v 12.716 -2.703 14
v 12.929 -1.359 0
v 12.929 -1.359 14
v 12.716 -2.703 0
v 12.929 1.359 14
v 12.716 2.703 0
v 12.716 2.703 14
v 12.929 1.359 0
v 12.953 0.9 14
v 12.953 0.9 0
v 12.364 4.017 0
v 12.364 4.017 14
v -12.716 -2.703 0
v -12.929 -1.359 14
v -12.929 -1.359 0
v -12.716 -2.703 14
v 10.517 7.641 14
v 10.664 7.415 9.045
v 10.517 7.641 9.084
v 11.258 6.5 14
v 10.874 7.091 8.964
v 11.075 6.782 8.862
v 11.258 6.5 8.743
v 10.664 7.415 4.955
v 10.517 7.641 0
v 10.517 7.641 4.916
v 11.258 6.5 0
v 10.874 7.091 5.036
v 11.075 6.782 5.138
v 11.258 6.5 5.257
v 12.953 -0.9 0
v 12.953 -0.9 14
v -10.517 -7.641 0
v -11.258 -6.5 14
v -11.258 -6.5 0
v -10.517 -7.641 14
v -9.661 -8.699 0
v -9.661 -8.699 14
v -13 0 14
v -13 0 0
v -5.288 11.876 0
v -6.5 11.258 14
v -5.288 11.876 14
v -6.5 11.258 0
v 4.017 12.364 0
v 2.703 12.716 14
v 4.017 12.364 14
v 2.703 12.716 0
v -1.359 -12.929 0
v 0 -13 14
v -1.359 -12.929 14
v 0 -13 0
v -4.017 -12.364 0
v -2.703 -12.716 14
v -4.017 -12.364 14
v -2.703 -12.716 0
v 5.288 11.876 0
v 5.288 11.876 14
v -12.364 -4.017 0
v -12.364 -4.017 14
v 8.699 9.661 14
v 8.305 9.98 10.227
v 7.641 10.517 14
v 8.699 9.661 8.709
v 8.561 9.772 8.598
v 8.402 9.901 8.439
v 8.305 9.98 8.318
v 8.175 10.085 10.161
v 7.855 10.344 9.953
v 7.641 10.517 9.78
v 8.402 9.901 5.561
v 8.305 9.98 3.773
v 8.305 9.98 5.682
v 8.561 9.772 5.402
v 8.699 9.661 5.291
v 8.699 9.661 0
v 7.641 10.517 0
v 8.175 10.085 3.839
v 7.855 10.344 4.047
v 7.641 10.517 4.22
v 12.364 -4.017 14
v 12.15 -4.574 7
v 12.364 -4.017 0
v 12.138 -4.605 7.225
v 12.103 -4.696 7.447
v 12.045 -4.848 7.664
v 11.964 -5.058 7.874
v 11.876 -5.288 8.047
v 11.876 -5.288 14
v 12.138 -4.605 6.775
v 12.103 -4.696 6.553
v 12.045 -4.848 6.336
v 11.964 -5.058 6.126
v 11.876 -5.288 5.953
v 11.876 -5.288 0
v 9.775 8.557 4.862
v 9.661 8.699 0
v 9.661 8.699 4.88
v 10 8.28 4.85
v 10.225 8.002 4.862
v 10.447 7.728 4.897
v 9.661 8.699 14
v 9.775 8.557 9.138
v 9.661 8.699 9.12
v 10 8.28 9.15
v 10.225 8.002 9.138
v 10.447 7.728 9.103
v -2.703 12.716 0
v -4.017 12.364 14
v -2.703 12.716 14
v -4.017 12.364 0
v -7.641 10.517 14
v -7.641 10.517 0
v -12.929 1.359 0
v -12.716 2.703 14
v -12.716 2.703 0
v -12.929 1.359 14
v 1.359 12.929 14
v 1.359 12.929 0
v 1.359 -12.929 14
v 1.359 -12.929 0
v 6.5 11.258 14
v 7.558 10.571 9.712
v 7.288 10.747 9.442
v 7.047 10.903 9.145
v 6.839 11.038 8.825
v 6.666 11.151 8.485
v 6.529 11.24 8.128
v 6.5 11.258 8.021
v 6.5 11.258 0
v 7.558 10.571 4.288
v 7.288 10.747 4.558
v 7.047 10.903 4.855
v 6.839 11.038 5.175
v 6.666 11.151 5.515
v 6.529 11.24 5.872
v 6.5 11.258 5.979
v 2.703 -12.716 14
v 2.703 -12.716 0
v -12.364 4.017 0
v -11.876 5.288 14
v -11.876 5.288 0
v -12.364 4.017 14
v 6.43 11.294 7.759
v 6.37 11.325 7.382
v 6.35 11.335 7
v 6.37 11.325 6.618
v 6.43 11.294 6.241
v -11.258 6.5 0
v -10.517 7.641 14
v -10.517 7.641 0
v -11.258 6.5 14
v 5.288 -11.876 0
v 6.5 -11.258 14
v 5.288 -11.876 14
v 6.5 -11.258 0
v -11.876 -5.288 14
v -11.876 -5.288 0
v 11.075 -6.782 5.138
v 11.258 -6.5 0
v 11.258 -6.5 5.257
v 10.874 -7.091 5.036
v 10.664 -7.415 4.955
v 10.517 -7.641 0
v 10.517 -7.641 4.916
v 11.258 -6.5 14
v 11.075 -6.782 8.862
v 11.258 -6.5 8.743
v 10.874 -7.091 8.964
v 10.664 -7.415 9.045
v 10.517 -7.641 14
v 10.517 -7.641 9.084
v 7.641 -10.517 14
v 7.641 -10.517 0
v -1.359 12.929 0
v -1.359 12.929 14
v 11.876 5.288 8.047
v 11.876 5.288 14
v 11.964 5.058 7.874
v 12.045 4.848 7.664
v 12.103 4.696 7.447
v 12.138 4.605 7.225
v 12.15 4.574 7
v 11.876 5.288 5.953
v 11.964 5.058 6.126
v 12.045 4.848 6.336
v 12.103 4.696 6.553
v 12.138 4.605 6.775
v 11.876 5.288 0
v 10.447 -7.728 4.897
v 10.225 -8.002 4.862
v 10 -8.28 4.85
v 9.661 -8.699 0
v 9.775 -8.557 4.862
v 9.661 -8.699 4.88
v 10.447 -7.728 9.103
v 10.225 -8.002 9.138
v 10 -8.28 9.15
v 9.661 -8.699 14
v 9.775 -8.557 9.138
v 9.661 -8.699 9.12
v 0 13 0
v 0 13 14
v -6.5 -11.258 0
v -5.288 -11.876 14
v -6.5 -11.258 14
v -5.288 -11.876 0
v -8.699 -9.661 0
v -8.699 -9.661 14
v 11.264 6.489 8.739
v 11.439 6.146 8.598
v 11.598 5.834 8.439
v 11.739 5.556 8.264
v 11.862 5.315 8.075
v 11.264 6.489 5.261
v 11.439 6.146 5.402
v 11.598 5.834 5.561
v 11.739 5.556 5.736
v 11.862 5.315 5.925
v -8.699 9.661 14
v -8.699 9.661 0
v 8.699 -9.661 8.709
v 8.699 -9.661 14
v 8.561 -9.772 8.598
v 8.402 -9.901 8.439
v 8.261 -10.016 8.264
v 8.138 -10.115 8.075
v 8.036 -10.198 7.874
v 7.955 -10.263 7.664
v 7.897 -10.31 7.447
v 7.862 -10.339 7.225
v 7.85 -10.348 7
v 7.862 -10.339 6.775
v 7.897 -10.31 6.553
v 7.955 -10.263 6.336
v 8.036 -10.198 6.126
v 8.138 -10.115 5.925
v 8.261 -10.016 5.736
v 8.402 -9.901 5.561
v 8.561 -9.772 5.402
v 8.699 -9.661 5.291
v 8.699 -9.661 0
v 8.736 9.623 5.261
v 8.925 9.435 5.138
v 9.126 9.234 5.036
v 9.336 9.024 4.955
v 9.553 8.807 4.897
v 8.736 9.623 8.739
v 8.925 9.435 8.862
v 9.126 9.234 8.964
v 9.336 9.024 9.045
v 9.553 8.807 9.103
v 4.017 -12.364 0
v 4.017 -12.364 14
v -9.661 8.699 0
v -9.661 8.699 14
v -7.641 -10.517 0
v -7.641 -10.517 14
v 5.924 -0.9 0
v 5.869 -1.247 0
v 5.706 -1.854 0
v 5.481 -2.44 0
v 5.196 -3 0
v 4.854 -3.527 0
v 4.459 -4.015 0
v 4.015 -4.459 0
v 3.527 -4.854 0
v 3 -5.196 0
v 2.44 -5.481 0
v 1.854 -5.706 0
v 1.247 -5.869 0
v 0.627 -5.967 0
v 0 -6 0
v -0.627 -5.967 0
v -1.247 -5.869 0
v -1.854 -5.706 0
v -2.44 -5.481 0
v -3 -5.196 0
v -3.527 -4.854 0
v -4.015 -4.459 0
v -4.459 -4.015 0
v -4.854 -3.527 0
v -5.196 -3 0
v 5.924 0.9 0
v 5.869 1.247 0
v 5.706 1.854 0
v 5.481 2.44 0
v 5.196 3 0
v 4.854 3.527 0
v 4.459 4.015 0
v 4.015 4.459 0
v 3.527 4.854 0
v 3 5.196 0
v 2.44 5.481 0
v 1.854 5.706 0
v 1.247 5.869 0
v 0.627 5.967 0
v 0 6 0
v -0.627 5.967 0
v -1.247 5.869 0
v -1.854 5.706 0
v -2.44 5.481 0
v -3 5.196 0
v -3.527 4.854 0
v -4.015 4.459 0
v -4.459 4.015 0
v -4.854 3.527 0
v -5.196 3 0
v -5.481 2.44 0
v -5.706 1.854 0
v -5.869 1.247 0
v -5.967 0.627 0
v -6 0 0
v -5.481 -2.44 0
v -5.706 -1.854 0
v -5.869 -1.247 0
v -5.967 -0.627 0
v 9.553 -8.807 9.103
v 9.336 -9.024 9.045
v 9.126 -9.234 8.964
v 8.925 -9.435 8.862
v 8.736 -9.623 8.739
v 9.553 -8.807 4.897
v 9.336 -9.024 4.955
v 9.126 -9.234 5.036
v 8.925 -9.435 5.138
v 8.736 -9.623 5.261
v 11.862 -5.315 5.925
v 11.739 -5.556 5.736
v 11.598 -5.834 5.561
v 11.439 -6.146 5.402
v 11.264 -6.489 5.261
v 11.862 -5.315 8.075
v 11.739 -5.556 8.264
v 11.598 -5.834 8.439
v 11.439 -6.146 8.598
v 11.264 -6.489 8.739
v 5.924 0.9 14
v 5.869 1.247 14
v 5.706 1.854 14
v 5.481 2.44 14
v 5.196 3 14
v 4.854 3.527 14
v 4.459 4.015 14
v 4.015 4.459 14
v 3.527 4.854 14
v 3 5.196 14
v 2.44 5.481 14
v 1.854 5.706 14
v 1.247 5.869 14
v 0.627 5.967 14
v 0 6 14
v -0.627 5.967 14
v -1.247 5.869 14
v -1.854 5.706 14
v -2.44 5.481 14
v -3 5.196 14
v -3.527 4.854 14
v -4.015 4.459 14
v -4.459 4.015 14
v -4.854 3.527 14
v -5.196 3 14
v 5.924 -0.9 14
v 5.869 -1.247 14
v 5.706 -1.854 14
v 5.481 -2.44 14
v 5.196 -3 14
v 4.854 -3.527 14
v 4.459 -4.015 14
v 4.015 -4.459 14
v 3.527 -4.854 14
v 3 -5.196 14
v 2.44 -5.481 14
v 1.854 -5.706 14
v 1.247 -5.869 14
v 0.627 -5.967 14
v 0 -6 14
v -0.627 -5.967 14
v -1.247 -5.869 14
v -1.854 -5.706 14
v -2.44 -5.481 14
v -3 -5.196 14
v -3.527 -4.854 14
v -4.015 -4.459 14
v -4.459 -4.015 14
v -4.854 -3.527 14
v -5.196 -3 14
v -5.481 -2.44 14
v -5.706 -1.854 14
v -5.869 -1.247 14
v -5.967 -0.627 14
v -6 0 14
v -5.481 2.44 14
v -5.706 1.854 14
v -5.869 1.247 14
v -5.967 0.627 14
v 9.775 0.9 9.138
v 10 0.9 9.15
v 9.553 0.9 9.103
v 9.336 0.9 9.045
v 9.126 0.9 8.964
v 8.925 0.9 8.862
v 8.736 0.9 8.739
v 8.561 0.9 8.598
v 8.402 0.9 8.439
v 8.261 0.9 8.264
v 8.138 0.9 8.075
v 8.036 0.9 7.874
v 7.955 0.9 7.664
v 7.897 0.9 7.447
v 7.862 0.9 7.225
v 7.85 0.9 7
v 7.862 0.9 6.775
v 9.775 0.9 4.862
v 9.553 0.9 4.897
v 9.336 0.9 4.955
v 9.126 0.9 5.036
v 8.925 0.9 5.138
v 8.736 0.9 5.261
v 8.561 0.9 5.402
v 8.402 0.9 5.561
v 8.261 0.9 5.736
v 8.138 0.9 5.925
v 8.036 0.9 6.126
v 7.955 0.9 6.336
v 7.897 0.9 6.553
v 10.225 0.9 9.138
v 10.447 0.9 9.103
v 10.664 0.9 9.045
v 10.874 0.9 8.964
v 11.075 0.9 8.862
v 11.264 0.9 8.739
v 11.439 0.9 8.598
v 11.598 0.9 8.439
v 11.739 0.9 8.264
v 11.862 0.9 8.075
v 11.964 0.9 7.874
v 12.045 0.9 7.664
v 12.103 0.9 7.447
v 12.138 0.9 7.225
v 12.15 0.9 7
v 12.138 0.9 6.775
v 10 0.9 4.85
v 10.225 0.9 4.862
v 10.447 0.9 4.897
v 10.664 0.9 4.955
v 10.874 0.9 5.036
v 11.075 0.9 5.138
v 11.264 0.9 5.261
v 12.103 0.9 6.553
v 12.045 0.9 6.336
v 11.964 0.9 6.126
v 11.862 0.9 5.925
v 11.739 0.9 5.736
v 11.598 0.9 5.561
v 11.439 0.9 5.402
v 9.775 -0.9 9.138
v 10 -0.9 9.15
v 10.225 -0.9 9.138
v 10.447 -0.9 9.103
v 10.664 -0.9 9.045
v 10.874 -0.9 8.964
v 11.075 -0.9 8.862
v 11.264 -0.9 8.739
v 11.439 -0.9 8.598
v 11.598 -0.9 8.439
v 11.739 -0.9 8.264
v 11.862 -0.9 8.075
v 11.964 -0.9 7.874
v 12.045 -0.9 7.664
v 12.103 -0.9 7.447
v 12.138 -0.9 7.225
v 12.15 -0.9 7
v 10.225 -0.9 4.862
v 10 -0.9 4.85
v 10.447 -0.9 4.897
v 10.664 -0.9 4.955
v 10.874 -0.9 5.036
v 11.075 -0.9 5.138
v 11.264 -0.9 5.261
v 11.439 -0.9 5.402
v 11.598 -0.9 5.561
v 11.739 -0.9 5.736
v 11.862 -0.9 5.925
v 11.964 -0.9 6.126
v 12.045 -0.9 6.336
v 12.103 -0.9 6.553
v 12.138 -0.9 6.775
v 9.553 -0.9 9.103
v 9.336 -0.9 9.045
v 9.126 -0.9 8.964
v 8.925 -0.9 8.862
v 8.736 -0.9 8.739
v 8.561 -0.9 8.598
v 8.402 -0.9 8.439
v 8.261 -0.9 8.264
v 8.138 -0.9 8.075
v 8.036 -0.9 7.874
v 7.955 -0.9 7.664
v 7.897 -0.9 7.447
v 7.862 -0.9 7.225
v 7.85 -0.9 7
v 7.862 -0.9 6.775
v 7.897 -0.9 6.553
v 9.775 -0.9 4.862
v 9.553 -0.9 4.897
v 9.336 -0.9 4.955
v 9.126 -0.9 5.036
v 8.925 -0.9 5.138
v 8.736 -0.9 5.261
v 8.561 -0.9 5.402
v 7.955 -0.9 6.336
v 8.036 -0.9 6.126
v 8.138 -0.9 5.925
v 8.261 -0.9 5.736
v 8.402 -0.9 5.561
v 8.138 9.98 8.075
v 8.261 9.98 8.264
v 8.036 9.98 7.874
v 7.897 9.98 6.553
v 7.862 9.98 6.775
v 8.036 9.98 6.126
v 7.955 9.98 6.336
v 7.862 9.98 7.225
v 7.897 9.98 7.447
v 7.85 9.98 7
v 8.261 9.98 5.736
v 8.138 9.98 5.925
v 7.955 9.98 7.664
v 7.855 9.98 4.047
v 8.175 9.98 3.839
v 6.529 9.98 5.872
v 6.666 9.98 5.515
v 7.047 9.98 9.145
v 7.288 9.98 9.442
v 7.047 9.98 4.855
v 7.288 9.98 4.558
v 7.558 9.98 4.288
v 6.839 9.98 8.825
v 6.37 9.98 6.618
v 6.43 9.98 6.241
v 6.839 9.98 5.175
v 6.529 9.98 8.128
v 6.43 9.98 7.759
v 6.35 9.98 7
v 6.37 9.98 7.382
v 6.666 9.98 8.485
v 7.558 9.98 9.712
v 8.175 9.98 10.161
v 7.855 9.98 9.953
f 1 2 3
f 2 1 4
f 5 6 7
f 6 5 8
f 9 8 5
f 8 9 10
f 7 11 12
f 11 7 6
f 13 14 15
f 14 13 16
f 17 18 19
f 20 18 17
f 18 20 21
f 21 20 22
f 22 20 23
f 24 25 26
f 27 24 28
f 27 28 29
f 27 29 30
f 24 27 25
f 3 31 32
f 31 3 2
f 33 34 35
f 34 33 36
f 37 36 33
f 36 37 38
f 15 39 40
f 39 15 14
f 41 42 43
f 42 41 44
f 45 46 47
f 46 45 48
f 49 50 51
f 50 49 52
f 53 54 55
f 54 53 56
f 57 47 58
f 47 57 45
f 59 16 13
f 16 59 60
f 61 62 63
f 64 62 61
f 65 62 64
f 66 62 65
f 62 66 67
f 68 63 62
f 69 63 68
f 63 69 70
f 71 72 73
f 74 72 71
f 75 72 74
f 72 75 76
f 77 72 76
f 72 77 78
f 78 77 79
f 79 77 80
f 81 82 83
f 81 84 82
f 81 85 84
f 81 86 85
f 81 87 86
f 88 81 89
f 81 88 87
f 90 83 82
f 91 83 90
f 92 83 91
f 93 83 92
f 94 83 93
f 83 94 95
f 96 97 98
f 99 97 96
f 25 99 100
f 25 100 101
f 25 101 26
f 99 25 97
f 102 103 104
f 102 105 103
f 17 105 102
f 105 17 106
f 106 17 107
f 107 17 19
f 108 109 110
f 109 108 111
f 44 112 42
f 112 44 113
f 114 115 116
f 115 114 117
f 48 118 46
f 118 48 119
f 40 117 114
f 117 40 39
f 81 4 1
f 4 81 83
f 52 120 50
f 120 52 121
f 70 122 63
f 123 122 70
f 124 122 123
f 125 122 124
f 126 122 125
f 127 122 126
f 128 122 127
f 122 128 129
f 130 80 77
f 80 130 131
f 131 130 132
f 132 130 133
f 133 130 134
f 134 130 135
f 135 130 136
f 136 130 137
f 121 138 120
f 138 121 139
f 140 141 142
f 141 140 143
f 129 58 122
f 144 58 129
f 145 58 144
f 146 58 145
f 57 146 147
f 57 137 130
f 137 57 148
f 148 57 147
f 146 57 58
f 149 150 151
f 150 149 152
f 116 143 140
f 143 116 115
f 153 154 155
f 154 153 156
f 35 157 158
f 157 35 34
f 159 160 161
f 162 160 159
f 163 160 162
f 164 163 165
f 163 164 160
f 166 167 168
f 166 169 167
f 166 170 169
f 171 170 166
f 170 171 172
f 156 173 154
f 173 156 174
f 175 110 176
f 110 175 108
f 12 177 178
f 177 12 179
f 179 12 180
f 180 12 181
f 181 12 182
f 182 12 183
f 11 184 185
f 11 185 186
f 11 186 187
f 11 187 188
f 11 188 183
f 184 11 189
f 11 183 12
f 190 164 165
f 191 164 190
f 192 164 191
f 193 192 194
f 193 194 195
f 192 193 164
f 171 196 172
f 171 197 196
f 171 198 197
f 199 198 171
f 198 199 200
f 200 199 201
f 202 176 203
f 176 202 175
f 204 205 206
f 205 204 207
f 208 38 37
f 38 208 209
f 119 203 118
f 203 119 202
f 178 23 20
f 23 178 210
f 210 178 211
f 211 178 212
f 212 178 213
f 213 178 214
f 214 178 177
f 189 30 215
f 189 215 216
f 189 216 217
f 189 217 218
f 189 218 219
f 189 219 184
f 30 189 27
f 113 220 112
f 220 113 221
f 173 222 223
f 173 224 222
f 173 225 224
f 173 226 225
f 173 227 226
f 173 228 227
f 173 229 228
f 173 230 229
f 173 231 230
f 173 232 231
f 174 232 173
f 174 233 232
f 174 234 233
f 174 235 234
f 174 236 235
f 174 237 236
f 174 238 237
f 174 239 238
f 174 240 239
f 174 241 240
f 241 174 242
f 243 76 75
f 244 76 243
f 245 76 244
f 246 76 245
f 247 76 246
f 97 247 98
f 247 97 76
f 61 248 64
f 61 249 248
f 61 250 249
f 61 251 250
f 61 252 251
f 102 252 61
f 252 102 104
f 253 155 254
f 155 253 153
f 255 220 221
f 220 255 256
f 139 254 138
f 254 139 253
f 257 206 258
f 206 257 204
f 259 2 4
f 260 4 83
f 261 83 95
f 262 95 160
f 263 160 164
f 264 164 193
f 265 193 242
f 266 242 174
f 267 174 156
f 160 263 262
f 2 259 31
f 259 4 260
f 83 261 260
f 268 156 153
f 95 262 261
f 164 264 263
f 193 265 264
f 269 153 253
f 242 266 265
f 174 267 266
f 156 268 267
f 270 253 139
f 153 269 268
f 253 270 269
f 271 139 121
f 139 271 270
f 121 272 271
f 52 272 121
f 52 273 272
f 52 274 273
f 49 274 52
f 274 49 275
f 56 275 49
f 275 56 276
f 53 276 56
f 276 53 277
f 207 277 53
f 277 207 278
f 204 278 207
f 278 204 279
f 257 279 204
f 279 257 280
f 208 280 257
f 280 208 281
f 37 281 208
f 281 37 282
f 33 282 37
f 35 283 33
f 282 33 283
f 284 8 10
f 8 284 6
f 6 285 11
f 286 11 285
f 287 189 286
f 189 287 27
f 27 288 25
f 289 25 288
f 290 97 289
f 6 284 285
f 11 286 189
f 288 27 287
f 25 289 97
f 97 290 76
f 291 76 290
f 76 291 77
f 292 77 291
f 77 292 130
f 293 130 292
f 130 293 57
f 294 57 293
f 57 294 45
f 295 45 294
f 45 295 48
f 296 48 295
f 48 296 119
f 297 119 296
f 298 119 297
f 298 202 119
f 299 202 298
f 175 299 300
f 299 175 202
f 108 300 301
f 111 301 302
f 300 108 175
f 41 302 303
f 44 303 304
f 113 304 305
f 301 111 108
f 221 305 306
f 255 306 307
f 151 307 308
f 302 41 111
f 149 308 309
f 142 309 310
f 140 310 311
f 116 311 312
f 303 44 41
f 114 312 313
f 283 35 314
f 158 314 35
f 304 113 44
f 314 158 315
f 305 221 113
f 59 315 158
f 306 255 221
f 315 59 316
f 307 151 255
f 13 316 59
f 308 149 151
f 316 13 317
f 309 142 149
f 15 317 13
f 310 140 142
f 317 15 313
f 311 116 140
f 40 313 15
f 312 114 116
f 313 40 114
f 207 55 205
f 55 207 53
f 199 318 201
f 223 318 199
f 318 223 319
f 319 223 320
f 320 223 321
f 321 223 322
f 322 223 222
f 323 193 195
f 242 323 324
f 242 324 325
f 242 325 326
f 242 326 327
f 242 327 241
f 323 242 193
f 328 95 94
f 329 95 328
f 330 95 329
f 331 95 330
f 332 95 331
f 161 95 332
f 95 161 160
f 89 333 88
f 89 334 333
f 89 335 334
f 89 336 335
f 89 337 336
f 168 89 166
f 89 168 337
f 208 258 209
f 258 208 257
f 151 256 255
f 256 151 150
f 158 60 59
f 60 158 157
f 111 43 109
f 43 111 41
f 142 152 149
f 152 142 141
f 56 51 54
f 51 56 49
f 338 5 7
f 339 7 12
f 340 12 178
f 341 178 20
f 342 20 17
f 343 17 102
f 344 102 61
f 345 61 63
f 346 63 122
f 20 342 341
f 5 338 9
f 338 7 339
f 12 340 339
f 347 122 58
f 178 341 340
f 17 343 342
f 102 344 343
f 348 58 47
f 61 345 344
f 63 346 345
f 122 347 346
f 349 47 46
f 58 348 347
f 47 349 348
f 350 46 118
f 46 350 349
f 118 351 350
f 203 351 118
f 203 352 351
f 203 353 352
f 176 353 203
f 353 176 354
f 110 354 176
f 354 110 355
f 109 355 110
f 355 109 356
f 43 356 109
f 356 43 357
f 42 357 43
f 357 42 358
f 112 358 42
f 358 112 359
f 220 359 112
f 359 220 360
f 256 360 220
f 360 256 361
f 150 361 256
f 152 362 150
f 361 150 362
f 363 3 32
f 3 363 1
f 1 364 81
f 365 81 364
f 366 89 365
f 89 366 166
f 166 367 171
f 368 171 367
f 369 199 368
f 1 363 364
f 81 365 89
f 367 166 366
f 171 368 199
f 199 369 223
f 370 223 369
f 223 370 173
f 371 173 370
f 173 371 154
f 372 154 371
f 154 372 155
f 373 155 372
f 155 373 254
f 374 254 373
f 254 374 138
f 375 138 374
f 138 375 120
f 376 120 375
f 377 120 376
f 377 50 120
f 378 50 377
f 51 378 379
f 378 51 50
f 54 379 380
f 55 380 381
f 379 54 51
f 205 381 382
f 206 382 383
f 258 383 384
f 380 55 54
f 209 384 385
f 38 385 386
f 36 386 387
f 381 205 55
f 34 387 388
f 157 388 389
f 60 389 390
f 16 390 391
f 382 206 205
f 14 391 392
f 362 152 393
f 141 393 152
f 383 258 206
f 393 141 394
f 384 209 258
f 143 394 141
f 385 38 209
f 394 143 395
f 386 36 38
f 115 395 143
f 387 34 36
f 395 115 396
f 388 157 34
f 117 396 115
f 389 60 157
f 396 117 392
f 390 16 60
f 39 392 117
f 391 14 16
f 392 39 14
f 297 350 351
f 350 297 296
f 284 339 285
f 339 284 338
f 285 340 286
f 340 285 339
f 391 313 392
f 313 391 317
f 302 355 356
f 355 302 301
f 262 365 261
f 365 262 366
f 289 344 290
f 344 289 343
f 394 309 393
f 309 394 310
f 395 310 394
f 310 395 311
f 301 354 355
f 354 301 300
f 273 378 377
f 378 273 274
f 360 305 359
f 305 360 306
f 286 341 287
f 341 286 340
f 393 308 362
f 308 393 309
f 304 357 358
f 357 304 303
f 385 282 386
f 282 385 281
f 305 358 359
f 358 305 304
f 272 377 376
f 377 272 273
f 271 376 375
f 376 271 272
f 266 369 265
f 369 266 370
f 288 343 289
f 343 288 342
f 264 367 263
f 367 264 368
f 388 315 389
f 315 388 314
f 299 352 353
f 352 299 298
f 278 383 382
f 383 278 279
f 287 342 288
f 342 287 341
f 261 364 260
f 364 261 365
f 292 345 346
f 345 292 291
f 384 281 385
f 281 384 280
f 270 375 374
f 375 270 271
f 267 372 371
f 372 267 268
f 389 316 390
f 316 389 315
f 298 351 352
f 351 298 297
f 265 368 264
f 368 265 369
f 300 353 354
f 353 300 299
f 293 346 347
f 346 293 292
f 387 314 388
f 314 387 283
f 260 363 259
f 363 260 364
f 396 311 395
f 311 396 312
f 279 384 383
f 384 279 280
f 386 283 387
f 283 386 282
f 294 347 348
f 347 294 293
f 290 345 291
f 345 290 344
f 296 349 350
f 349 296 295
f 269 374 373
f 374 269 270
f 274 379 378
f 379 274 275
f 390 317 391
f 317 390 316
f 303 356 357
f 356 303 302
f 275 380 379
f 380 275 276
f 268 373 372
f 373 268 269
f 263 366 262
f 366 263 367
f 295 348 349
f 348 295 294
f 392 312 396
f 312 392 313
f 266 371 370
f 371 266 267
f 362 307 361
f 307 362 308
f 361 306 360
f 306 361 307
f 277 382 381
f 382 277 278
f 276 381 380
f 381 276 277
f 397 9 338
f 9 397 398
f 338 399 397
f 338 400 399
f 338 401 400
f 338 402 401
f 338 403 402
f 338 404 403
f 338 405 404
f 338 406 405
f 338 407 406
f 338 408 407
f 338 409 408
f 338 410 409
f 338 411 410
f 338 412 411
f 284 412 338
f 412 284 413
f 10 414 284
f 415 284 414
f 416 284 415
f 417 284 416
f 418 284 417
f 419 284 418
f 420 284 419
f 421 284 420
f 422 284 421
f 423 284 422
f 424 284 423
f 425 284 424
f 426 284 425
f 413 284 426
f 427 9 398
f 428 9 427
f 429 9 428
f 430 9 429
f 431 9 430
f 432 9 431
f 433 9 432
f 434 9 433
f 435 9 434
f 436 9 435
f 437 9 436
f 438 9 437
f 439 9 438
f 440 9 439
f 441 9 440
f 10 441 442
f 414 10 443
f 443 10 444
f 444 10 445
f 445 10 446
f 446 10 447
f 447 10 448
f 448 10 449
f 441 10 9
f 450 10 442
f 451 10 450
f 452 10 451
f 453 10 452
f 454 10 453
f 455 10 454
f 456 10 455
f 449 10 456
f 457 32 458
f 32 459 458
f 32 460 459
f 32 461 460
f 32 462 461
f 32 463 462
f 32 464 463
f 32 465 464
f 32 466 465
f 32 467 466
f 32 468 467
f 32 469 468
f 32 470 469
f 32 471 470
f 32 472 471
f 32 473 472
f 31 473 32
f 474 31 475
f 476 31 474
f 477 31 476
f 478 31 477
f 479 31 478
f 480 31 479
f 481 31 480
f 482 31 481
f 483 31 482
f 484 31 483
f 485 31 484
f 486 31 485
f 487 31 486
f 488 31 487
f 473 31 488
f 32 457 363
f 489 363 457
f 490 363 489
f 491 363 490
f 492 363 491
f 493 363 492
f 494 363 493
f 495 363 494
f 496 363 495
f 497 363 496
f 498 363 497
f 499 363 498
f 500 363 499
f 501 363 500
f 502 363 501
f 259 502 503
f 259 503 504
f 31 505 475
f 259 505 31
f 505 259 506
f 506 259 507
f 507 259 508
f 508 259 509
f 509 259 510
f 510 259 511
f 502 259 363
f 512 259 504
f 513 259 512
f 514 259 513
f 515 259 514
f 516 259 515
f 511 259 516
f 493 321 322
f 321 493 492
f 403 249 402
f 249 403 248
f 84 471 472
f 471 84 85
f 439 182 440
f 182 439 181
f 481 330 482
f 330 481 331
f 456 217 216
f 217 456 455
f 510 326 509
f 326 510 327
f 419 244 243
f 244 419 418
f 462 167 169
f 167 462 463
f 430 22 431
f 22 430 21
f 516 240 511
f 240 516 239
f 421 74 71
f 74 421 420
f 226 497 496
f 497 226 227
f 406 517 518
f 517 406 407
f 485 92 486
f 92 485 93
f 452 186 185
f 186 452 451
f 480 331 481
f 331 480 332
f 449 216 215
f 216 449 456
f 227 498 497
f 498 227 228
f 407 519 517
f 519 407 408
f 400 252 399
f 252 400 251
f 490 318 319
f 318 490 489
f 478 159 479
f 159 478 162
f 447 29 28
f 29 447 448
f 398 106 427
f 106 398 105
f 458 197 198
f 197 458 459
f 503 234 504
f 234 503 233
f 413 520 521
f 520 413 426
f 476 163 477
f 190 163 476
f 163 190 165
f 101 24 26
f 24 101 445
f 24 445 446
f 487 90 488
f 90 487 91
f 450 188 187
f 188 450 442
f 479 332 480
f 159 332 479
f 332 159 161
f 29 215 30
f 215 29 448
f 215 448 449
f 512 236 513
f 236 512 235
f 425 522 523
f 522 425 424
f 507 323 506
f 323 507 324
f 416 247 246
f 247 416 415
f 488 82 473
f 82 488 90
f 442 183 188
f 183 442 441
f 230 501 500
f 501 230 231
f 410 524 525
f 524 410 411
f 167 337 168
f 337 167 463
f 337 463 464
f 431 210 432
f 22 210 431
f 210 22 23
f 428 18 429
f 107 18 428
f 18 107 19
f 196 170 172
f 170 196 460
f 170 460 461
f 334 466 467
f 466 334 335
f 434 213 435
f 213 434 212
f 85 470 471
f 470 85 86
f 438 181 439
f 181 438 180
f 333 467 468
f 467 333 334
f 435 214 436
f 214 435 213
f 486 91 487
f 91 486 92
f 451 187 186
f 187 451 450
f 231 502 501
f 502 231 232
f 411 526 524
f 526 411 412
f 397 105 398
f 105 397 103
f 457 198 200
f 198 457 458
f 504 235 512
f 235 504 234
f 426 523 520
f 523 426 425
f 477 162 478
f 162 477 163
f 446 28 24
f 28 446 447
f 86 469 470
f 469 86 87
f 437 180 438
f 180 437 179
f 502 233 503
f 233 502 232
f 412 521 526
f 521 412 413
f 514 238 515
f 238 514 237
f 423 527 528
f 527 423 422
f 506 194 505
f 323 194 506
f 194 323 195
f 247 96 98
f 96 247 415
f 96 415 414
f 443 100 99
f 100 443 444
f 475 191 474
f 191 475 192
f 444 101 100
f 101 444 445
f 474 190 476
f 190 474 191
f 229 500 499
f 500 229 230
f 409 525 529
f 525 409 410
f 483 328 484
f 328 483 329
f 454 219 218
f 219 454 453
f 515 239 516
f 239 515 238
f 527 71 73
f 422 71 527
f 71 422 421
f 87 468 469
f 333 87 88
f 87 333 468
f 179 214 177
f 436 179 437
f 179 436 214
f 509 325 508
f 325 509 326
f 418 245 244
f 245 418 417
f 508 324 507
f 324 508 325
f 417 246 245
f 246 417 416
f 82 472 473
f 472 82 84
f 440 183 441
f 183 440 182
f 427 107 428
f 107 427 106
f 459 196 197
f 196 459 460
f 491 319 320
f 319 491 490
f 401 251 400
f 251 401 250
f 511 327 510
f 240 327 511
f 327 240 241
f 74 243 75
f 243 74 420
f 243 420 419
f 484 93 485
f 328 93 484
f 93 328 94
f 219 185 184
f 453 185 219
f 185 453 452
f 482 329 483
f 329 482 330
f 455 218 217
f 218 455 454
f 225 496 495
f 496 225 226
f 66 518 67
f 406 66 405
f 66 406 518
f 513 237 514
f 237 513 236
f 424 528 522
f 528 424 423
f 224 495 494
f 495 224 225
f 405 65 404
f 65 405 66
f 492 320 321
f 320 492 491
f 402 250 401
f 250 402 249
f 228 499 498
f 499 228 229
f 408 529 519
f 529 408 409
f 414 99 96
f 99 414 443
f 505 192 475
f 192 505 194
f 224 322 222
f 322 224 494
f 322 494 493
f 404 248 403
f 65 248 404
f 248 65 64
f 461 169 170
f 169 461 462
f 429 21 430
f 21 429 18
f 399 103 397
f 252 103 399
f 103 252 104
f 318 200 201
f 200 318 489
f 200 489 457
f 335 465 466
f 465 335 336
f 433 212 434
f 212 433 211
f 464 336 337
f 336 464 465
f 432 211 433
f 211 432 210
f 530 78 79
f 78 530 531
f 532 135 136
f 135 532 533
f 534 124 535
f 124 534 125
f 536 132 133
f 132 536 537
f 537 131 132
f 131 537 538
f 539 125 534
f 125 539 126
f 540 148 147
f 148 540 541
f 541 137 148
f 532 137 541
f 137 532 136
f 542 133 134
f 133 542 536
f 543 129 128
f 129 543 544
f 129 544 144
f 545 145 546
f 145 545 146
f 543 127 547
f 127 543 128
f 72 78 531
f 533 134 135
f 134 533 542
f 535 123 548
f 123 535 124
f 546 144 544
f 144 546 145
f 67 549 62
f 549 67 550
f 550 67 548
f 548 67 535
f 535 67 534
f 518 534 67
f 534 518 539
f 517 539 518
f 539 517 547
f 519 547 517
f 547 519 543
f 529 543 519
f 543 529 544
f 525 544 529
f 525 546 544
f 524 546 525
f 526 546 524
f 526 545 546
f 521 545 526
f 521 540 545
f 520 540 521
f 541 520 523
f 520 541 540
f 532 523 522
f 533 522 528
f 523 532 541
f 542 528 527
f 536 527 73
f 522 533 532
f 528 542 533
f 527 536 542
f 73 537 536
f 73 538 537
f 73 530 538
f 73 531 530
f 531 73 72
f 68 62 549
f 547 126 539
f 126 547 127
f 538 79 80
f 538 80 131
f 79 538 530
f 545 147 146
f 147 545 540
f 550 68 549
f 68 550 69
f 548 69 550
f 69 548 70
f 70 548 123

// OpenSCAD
// C-style split collar for 12 mm shaft.
$fn = 60;
eps = 0.02;
shaft_d = 12;
outer_d = 26;
width = 14;
slit_w = 1.8;
screw_d = 4.3;
difference() {
    cylinder(d = outer_d, h = width);
    translate([0, 0, -eps]) cylinder(d = shaft_d, h = width + 2 * eps);
    translate([0, -slit_w / 2, -eps]) cube([outer_d / 2 + eps, slit_w, width + 2 * eps]);
    translate([outer_d / 2 - 3, -outer_d / 2 - eps, width / 2]) rotate([-90, 0, 0]) cylinder(d = screw_d, h = outer_d + 2 * eps);
    translate([outer_d / 2 - 3, outer_d / 2 - 3 - eps, width / 2]) rotate([-90, 0, 0]) cylinder(d = screw_d + 3, h = 3 + 2 * eps);
}
